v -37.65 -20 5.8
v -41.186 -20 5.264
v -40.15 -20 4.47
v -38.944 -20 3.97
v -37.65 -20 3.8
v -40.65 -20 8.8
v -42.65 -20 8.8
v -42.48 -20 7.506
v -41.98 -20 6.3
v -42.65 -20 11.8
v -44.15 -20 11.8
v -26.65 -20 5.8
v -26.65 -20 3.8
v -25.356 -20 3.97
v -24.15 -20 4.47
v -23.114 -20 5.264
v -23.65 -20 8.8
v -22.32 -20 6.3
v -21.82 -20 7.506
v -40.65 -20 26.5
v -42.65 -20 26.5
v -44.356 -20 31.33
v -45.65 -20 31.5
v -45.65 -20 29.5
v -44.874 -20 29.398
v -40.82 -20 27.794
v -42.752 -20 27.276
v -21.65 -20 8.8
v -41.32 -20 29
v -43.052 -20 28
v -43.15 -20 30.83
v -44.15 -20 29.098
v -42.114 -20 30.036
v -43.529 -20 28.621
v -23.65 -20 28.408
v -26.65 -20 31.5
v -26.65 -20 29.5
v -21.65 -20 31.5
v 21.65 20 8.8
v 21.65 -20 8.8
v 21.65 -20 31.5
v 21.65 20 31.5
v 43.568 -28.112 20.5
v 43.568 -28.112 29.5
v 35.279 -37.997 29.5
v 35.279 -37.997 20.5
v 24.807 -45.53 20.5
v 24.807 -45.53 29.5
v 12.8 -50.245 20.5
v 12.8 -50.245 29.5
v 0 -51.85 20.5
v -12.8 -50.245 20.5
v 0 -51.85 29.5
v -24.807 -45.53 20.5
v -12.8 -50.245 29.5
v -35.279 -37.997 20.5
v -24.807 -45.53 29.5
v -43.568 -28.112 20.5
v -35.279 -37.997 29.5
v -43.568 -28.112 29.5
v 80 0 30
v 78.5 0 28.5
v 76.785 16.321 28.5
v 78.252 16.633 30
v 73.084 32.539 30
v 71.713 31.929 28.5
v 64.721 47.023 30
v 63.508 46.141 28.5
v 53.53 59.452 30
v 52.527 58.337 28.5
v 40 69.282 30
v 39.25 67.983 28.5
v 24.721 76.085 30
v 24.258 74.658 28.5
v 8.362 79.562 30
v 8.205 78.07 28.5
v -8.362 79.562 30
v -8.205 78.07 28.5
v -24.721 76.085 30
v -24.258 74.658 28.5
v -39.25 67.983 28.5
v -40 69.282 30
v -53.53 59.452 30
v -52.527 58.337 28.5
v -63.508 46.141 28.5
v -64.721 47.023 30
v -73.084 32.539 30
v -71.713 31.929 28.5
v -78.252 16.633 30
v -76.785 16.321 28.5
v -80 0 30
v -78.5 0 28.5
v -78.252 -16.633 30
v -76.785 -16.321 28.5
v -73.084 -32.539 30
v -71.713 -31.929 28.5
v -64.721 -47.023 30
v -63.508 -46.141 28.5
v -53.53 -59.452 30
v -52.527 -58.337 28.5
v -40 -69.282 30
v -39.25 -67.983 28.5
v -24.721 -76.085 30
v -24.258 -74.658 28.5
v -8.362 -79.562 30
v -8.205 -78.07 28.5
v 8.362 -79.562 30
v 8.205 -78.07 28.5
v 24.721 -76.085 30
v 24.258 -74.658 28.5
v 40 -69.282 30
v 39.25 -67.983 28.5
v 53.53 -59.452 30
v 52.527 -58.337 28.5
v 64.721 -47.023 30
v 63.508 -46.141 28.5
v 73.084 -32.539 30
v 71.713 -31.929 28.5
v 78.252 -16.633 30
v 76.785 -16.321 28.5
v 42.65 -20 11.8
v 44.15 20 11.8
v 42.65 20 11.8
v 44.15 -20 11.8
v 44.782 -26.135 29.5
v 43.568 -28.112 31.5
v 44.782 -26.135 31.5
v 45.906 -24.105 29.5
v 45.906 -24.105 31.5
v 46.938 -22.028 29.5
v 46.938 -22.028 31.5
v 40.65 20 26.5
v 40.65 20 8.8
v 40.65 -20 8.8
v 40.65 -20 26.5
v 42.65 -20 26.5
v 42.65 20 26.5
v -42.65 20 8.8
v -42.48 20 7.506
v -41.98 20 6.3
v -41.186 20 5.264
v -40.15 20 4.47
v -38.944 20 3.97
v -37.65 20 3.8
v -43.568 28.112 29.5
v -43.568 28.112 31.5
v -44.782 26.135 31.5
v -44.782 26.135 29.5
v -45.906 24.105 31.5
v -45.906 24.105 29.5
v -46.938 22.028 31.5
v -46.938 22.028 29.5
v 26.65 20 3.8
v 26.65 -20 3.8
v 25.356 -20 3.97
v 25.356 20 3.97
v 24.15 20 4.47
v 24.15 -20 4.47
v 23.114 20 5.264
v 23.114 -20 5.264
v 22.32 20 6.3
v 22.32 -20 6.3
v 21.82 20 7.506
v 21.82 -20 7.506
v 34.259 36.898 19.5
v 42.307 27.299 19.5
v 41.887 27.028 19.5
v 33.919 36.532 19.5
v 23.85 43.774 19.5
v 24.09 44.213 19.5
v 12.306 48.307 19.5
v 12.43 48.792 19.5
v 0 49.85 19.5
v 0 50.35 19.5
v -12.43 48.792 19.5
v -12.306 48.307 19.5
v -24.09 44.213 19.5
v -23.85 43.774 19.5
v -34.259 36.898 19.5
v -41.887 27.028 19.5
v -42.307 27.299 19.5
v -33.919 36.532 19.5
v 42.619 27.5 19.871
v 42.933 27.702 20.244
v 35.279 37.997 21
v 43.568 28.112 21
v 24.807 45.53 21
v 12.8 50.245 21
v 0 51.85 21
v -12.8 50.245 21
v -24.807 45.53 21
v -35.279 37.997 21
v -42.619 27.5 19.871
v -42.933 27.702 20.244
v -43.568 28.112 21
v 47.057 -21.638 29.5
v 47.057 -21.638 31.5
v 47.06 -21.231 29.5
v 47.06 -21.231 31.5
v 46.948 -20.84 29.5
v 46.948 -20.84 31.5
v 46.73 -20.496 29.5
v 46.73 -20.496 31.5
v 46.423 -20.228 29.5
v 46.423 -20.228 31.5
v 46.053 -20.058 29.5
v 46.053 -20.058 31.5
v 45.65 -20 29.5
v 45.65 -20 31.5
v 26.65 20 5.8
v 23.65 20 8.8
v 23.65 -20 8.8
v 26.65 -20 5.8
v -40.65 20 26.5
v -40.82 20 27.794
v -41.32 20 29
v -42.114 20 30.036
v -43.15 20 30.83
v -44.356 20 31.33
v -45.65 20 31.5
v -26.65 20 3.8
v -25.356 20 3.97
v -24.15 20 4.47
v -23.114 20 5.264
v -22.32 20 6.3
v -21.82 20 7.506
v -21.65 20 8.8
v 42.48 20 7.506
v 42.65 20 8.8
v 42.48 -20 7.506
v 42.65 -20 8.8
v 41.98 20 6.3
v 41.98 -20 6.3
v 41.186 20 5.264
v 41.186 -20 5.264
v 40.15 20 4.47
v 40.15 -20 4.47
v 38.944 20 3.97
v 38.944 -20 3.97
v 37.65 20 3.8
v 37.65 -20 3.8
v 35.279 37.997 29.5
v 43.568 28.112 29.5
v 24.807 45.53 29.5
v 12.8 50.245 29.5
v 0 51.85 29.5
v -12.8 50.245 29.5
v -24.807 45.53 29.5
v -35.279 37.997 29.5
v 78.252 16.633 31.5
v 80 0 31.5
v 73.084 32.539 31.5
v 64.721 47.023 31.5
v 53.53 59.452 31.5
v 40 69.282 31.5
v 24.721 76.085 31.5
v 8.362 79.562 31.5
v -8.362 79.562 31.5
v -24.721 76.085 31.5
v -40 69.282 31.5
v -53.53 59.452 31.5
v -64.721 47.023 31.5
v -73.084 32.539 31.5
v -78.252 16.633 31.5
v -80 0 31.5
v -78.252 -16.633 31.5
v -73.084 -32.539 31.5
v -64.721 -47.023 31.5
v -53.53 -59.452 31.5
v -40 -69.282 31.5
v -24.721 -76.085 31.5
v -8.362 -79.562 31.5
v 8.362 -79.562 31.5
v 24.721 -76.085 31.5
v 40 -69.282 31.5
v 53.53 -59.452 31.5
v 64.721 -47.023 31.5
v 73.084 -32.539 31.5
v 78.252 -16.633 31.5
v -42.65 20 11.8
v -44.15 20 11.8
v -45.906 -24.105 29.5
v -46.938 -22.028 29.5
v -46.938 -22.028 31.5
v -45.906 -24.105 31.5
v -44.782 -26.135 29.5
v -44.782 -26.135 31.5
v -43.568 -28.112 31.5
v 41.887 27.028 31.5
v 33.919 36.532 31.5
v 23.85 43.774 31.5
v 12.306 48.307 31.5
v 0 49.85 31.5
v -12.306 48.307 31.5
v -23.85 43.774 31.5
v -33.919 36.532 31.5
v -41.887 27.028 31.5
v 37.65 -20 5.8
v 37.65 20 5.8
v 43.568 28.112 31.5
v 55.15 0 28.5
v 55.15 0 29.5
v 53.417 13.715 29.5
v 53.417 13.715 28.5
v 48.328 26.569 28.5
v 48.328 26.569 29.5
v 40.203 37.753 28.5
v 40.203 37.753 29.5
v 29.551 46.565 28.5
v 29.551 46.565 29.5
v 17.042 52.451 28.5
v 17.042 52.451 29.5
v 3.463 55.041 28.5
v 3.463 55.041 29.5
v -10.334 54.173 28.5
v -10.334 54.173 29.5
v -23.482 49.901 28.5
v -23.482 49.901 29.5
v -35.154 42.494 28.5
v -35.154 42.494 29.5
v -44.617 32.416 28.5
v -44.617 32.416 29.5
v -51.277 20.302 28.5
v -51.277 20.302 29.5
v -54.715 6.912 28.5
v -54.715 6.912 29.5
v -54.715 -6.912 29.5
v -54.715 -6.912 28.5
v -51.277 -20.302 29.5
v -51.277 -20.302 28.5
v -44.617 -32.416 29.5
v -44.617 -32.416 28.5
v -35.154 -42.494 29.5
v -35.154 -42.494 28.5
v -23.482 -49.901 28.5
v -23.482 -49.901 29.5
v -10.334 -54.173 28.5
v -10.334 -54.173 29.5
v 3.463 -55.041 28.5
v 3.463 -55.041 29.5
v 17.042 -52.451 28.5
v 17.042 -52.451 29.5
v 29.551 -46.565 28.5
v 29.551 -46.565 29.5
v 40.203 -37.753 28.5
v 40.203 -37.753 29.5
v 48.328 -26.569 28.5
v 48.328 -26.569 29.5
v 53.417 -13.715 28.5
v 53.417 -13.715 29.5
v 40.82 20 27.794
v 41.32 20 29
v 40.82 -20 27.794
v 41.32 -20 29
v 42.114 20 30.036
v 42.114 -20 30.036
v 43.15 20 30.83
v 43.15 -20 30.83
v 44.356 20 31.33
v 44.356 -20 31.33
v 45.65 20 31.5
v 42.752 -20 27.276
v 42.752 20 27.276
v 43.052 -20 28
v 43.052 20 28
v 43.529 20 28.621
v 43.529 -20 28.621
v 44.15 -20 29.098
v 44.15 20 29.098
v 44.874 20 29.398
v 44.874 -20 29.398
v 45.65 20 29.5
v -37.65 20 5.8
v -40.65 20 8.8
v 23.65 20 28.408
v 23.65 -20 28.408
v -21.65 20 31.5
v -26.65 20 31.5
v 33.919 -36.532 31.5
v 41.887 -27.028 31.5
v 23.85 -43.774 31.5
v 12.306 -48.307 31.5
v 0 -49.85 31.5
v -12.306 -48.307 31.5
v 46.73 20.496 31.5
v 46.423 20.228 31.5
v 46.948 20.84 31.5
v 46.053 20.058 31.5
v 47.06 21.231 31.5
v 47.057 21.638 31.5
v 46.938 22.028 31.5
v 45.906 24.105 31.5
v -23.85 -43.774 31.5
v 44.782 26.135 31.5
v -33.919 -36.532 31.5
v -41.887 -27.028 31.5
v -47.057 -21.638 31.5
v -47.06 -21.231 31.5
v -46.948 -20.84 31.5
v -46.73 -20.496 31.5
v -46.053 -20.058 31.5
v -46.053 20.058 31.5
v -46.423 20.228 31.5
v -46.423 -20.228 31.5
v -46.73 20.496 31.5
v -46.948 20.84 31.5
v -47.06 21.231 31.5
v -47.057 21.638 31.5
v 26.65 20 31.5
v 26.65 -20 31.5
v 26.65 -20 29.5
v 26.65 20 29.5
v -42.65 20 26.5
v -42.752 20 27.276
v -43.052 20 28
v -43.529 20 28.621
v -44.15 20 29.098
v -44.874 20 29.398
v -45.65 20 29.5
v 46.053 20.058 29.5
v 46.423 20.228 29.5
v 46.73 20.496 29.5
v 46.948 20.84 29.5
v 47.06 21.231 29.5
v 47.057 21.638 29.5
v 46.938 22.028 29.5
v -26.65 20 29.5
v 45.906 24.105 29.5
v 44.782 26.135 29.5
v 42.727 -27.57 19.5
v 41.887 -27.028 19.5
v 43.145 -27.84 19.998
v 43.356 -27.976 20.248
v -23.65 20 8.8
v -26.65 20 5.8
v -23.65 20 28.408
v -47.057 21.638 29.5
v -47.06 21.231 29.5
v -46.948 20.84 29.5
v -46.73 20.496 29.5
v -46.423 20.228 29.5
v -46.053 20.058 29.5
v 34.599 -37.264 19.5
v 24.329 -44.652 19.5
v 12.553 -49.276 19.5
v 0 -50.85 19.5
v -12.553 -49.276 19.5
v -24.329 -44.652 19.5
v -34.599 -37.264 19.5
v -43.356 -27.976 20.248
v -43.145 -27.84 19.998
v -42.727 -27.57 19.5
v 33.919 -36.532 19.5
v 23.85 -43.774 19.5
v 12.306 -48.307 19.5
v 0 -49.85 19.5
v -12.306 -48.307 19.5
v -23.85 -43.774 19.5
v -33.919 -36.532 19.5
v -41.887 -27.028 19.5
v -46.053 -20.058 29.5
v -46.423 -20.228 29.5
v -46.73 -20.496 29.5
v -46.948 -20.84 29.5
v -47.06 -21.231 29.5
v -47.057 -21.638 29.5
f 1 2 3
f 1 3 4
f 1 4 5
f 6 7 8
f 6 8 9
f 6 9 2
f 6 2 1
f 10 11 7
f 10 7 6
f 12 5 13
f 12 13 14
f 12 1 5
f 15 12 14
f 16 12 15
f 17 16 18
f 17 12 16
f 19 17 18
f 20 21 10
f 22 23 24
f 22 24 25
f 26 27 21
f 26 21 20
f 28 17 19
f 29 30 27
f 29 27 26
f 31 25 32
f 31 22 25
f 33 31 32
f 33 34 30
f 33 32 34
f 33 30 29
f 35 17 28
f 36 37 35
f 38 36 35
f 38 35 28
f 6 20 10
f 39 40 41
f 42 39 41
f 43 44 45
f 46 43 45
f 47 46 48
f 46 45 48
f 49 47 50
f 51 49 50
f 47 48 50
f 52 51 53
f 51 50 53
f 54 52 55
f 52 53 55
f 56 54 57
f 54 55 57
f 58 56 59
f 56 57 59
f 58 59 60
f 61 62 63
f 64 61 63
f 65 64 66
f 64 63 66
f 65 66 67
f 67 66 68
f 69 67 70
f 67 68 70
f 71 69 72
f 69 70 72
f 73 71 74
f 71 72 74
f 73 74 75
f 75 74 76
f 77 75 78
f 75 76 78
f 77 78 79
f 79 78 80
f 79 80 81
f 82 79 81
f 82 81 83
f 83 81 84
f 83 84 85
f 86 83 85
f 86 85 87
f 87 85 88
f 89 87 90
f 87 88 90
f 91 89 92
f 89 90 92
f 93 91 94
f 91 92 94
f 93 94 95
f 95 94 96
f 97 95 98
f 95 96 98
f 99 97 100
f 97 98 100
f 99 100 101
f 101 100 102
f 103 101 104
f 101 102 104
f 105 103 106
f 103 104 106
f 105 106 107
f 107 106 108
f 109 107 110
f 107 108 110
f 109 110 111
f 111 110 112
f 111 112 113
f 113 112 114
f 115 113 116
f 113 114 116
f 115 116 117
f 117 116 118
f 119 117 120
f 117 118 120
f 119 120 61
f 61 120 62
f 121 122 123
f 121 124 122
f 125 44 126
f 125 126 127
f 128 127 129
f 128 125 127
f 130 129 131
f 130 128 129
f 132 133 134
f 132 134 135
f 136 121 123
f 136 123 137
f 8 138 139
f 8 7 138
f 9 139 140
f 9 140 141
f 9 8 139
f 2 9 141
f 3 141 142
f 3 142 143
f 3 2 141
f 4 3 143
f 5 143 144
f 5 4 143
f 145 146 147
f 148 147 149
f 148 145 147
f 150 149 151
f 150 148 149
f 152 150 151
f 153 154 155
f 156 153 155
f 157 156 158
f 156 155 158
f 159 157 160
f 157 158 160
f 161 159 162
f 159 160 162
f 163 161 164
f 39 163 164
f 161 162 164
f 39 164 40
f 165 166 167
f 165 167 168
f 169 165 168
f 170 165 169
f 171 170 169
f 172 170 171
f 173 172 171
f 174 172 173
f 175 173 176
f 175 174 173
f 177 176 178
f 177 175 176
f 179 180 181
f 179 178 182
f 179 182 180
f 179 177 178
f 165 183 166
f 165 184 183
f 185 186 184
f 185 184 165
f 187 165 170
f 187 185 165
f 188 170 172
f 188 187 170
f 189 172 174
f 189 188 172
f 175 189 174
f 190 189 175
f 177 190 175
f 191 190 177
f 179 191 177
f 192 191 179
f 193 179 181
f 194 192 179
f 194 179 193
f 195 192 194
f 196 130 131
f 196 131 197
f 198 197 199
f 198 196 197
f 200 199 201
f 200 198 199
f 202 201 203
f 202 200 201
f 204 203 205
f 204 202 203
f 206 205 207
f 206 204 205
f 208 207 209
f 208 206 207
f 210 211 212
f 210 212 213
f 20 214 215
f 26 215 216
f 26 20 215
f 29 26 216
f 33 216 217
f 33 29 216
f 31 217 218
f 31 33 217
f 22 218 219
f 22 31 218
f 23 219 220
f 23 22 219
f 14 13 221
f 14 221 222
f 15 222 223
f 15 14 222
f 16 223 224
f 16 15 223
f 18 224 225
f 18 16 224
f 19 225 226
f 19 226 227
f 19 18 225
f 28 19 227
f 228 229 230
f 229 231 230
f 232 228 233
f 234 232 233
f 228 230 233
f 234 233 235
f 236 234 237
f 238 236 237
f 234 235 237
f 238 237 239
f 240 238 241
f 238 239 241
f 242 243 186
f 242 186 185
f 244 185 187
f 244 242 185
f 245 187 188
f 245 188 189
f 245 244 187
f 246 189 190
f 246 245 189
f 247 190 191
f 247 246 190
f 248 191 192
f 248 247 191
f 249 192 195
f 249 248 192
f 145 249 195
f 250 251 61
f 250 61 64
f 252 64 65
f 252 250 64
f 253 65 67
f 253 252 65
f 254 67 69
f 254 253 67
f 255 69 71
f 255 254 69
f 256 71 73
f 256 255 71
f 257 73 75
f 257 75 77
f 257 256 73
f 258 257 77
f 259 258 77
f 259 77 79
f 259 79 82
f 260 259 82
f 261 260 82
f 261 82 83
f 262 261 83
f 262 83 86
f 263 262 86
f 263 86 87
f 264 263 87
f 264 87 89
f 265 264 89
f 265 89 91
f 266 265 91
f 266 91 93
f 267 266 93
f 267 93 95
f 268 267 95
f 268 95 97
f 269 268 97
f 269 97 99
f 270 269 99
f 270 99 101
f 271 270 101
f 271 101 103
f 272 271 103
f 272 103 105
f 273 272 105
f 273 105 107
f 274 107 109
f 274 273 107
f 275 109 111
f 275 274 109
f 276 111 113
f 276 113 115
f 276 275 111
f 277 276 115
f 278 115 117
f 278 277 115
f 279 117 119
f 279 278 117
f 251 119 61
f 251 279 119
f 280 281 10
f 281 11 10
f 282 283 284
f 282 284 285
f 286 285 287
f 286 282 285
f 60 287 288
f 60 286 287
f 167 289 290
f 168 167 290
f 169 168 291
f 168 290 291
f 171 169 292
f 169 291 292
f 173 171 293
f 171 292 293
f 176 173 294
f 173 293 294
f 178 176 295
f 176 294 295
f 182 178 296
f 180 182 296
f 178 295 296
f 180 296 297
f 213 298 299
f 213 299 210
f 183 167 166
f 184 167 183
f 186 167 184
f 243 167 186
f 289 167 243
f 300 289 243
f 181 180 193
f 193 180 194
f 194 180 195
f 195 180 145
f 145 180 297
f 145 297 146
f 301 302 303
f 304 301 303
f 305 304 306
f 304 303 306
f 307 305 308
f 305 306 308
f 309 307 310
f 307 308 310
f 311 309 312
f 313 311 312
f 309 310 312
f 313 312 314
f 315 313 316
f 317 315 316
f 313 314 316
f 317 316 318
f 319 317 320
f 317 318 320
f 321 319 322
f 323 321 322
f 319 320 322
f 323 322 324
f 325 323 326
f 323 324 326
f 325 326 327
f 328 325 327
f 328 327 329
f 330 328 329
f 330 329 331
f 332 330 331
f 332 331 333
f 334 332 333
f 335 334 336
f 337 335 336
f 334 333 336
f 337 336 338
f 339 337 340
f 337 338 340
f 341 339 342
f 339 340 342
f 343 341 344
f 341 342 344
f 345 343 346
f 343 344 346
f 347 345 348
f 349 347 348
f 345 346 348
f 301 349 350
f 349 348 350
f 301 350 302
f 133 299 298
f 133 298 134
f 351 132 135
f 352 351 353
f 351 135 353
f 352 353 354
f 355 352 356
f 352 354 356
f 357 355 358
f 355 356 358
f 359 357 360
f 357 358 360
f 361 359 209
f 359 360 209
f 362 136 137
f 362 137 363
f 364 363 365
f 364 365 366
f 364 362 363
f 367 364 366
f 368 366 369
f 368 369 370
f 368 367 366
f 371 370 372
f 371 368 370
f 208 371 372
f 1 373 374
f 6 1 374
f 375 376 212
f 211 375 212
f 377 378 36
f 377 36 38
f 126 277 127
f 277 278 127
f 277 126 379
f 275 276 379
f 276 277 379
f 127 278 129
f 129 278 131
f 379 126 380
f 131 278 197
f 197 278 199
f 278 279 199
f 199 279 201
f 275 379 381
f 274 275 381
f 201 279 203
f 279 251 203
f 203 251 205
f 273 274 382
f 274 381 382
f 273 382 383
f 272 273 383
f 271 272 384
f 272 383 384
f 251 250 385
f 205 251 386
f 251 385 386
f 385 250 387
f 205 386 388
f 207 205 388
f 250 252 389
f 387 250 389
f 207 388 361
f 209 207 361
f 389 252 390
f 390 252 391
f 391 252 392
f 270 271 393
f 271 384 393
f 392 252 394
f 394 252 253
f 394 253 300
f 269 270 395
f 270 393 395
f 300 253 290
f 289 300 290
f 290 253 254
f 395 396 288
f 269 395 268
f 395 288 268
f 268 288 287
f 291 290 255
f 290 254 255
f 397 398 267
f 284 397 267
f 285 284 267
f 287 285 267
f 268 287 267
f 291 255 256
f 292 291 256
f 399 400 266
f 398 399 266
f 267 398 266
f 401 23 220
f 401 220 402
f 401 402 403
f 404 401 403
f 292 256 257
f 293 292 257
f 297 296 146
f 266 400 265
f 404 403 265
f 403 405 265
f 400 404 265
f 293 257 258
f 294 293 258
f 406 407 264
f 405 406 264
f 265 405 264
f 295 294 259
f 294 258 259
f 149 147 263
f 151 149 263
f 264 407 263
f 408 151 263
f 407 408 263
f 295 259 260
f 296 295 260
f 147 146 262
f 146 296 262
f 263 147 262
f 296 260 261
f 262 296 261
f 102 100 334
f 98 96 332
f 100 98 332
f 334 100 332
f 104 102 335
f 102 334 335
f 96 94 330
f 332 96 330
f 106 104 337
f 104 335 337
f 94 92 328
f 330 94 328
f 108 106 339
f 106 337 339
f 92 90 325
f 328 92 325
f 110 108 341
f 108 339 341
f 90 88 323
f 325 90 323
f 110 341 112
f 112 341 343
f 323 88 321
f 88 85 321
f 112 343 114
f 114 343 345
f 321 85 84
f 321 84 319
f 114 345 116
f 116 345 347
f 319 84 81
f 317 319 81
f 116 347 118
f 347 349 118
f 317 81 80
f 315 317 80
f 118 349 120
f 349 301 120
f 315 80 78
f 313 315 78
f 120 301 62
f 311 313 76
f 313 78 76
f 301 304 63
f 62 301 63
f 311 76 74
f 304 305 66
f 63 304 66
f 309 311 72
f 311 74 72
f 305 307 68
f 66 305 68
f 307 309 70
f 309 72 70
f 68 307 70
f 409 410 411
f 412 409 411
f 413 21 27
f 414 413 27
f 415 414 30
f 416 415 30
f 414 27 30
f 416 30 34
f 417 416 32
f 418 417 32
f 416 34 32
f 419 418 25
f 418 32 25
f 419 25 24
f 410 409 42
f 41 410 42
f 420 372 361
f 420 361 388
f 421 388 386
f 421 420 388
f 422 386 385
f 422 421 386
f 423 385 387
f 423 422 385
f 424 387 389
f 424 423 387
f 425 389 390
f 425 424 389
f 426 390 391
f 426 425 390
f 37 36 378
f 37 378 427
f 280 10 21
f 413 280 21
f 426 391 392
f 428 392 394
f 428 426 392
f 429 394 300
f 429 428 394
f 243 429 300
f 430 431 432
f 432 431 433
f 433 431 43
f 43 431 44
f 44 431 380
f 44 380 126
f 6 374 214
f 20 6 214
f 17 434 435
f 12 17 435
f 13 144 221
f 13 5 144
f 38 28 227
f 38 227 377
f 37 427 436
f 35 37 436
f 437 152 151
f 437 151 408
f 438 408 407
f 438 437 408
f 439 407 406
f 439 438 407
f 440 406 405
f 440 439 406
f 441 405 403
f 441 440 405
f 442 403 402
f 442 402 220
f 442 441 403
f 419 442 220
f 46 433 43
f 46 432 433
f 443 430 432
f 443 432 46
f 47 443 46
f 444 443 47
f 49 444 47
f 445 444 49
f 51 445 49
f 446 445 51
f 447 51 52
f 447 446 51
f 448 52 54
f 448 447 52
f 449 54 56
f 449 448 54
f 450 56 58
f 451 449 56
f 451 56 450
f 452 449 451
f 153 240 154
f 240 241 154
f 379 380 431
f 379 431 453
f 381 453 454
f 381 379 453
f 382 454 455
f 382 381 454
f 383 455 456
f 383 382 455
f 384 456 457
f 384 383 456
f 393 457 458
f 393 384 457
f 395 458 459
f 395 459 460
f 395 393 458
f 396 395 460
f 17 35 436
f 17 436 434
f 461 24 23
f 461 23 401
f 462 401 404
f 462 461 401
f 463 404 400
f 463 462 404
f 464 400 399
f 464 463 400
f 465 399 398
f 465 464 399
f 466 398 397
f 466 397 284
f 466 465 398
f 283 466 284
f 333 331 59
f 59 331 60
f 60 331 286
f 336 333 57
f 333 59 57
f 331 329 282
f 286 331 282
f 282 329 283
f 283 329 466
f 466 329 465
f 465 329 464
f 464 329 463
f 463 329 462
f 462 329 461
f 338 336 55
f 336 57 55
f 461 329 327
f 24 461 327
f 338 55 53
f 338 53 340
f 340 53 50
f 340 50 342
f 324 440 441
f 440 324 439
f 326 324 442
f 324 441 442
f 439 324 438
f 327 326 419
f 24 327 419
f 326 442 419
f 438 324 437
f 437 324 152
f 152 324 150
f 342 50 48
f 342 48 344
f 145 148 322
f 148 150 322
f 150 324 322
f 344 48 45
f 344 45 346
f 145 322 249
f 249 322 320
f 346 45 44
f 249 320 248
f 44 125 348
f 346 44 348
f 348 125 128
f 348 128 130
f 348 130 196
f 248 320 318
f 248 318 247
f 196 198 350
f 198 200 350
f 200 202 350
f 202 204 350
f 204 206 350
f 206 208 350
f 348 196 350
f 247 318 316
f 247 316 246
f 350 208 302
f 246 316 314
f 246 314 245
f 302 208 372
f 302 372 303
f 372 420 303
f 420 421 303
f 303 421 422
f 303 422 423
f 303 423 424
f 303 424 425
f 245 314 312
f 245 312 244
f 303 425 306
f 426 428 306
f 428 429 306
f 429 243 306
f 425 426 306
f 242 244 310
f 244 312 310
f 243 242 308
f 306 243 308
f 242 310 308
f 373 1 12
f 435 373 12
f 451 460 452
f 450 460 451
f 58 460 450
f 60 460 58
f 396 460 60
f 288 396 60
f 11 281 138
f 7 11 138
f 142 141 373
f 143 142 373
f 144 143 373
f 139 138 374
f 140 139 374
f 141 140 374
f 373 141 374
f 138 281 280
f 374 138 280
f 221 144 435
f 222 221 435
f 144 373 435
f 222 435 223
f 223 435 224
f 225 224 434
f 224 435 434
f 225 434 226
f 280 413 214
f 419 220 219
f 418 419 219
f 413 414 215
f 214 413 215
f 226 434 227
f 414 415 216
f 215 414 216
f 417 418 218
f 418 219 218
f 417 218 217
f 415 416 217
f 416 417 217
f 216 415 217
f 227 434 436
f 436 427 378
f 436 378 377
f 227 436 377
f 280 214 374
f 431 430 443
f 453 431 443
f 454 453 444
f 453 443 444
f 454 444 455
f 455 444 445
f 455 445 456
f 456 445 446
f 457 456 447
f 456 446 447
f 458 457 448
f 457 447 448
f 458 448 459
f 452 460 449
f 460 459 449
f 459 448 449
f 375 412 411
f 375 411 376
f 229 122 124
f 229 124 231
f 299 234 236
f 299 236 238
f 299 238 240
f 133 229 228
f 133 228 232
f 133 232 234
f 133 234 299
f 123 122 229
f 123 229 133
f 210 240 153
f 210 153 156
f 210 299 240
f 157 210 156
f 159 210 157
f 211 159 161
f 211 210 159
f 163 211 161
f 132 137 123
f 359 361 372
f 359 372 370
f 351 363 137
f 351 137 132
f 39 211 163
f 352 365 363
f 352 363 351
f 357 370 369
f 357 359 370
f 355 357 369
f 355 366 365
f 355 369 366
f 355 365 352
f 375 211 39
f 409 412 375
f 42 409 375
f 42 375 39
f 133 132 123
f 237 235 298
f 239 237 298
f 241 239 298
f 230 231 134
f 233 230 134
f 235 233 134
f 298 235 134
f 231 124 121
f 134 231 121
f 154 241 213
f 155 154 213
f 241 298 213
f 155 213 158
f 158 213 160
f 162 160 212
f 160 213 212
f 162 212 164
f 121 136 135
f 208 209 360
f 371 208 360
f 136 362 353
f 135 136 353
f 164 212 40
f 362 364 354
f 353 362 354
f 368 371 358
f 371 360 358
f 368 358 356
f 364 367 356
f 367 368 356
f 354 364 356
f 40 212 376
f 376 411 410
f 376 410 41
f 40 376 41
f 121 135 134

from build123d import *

# Parameters (mm, degrees)
SKETCH007_R           = 80
SKETCH007_R_2         = 55.15
EXTRUDE002_DEPTH      = 1
EXTRUDE_DEPTH         = 20
EXTRUDE003_DEPTH      = 2
EXTRUDE003_DEPTH_BACK = 10
SKETCH006_R           = 80
EXTRUDE001_DEPTH      = 2
CHAMFER_1_SIZE        = 1.5
CHAMFER_2_SIZE        = 1


with BuildPart() as extrude002:
    # Sketch007 → Extrude002 (new body)
    with BuildSketch(Plane.XY):
        Circle(SKETCH007_R)
        Circle(SKETCH007_R_2, mode=Mode.SUBTRACT)
    extrude(amount=-EXTRUDE002_DEPTH)


with BuildPart() as extrude002_1:
    # Extrude002 placement: moved
    add(extrude002.part.moved(Location((0, 0, 29.5))))


with BuildPart() as extrude_body:
    # Sketch005 → Extrude (new body, symmetric)
    with BuildSketch(Plane.XZ):
        with BuildLine():
            Line((-37.65, 3.8), (-26.65, 3.8))
            ThreePointArc((-26.65, 3.8), (-23.114466, 5.264466), (-21.65, 8.8))
            Line((-21.65, 8.8), (-21.65, 31.5))
            Line((-26.65, 31.5), (-21.65, 31.5))
            Line((-26.65, 31.5), (-26.65, 29.5))
            Line((-26.65, 29.5), (-23.65, 28.408089))
            Line((-23.65, 28.408089), (-23.65, 8.8))
            Line((-23.65, 8.8), (-26.65, 5.8))
            Line((-37.65, 5.8), (-26.65, 5.8))
            Line((-37.65, 5.8), (-40.65, 8.8))
            Line((-40.65, 8.8), (-40.65, 26.5))
            ThreePointArc((-40.65, 26.5), (-42.114466, 30.035534), (-45.65, 31.5))
            Line((-45.65, 29.5), (-45.65, 31.5))
            ThreePointArc((-42.65, 26.5), (-43.52868, 28.62132), (-45.65, 29.5))
            Line((-42.65, 11.8), (-42.65, 26.5))
            Line((-44.15, 11.8), (-42.65, 11.8))
            Line((-44.15, 11.8), (-42.65, 8.8))
            ThreePointArc((-42.65, 8.8), (-41.185534, 5.264466), (-37.65, 3.8))
        make_face()
    extrude(amount=EXTRUDE_DEPTH, both=True)


with BuildPart() as part_mirroring:
    # Part__Mirroring: instance of Extrude body
    add(extrude_body.part.mirror(Plane(origin=(0, 0, 0), x_dir=(0, -1, 0), z_dir=(1, 0, 0))))


with BuildPart() as frontplateoverhang:
    # Sketch008 → Extrude003 (new body, two sides)
    with BuildSketch(Plane.XY) as extrude003_sk:
        with BuildLine():
            ThreePointArc((41.88707, 27.027688), (0, 49.85), (-41.88707, 27.027688))
            Line((-41.88707, 27.027688), (-43.567594, 28.112048))
            ThreePointArc((43.567594, 28.112048), (0, 51.85), (-43.567594, 28.112048))
            Line((41.88707, 27.027688), (43.567594, 28.112048))
        make_face()
    extrude(amount=EXTRUDE003_DEPTH)
    extrude(extrude003_sk.sketch, amount=-EXTRUDE003_DEPTH_BACK)


with BuildPart() as frontplateoverhang_1:
    # Extrude003 placement: moved
    add(frontplateoverhang.part.moved(Location((0, 0, 29.5))))


with BuildPart() as part_mirroring001:
    # Part__Mirroring001: instance of frontplateoverhang
    add(frontplateoverhang_1.part.mirror(Plane(origin=(0, 0, 0), x_dir=(1, 0, 0), z_dir=(0, 1, 0))))


with BuildPart() as frontplate:
    # Sketch006 → Extrude001 (new body)
    with BuildSketch(Plane.XY):
        Circle(SKETCH006_R)
        with BuildLine():
            Line((-45.65, 0), (-45.65, 20))
            ThreePointArc((-46.938294, 22.027688), (-46.851168, 20.65994), (-45.65, 20))
            ThreePointArc((46.938287, 22.027703), (-8e-06, 51.85), (-46.938294, 22.027688))
            ThreePointArc((45.65, 20), (46.851173, 20.659947), (46.938287, 22.027703))
            Line((45.65, 0), (45.65, 20))
            Line((45.65, 0), (45.65, -20))
            ThreePointArc((46.938287, -22.027703), (46.851173, -20.659947), (45.65, -20))
            ThreePointArc((-46.938294, -22.027688), (-8e-06, -51.85), (46.938287, -22.027703))
            ThreePointArc((-45.65, -20), (-46.851168, -20.65994), (-46.938294, -22.027688))
            Line((-45.65, 0), (-45.65, -20))
        make_face(mode=Mode.SUBTRACT)
    extrude(amount=EXTRUDE001_DEPTH)


with BuildPart() as frontplate_1:
    # Extrude001 placement: moved
    add(frontplate.part.moved(Location((0, 0, 29.5))))

    # Fusion: union Extrude002, Part__Mirroring, Extrude body, Part__Mirroring001, frontplateoverhang
    add(extrude002_1.part)
    add(part_mirroring.part)
    add(extrude_body.part)
    add(part_mirroring001.part)
    add(frontplateoverhang_1.part)

    # Chamfer 1
    chamfer_1_edges = [frontplate_1.edges().sort_by_distance(p)[0] for p in [
        (-80, 0, 28.5),
        (0, 51.85, 19.5),
    ]]
    chamfer(chamfer_1_edges, length=CHAMFER_1_SIZE)

    # Chamfer 2
    chamfer_2_edges = [frontplate_1.edges().sort_by_distance(p)[0] for p in [
        (0, -51.85, 19.5),
    ]]
    chamfer(chamfer_2_edges, length=CHAMFER_2_SIZE)


solid = frontplate_1.part
